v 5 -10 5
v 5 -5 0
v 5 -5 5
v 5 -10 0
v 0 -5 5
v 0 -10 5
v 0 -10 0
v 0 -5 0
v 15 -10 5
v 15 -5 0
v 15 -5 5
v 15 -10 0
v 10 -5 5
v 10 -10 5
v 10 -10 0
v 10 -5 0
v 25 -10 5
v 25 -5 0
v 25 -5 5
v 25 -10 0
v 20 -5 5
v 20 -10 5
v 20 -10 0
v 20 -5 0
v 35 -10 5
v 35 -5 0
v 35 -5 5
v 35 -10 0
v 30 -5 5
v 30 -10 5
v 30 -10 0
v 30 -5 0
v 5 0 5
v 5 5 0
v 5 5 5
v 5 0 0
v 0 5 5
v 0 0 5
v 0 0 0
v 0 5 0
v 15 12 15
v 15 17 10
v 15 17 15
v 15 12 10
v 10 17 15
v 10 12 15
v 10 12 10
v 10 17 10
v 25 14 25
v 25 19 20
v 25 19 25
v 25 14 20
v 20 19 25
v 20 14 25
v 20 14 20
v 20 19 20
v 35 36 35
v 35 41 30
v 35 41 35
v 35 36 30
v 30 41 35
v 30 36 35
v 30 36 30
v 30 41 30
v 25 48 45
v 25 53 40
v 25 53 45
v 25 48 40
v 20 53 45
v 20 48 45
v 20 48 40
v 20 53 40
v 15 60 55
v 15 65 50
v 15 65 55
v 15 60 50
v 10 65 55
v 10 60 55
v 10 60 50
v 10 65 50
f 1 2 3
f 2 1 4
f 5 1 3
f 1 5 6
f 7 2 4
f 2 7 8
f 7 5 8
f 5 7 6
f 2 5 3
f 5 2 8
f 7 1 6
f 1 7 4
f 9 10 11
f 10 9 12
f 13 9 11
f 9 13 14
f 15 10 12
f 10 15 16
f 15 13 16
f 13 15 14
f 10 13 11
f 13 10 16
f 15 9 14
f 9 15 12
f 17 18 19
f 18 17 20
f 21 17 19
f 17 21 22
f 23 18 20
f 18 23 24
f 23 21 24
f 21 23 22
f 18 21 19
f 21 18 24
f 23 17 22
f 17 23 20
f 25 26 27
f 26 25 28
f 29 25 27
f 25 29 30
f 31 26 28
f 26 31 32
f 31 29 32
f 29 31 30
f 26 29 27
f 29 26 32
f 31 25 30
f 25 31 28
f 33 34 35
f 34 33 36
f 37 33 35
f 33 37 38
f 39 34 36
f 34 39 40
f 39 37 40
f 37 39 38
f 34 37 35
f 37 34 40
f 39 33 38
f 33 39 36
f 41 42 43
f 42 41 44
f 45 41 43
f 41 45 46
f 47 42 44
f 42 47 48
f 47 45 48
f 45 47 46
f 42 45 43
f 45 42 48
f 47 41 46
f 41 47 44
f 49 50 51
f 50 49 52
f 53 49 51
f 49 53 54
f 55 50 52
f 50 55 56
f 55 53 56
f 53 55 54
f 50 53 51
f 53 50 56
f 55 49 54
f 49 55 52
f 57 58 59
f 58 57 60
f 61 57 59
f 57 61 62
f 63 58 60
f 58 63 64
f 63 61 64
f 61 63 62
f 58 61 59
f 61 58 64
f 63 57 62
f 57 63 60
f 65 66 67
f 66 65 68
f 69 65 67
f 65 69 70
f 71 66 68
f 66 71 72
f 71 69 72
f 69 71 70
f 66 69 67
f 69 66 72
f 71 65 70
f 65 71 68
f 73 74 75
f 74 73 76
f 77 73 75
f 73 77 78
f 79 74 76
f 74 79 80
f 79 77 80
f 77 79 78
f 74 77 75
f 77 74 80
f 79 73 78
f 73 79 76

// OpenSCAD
/*
*******************************************
Objekt Info: Beispiel for i

*******************************************
Version: 23.04.2024 khf
*******************************************
*/

//***************   Auswahl   *************

//keine

//***************   Libraries  ************

//keine

//*****************************************

//***************  Parameter   *************
$fn=60; //Aufloesung


//*****************************************

//**************   Programm  **************
color( "Red" ) { 
for (i=[0:3])
   translate([i*10,-10,0])
    cube(5);
 }


color( "Blue" ) { 
for(i = [ [ 0,  0,  0],
          [10, 12, 10],
          [20, 14, 20],
          [30, 36, 30],
          [20, 48, 40],
          [10, 60, 50] ])
{
   translate(i)
   cube(5);
}
}
